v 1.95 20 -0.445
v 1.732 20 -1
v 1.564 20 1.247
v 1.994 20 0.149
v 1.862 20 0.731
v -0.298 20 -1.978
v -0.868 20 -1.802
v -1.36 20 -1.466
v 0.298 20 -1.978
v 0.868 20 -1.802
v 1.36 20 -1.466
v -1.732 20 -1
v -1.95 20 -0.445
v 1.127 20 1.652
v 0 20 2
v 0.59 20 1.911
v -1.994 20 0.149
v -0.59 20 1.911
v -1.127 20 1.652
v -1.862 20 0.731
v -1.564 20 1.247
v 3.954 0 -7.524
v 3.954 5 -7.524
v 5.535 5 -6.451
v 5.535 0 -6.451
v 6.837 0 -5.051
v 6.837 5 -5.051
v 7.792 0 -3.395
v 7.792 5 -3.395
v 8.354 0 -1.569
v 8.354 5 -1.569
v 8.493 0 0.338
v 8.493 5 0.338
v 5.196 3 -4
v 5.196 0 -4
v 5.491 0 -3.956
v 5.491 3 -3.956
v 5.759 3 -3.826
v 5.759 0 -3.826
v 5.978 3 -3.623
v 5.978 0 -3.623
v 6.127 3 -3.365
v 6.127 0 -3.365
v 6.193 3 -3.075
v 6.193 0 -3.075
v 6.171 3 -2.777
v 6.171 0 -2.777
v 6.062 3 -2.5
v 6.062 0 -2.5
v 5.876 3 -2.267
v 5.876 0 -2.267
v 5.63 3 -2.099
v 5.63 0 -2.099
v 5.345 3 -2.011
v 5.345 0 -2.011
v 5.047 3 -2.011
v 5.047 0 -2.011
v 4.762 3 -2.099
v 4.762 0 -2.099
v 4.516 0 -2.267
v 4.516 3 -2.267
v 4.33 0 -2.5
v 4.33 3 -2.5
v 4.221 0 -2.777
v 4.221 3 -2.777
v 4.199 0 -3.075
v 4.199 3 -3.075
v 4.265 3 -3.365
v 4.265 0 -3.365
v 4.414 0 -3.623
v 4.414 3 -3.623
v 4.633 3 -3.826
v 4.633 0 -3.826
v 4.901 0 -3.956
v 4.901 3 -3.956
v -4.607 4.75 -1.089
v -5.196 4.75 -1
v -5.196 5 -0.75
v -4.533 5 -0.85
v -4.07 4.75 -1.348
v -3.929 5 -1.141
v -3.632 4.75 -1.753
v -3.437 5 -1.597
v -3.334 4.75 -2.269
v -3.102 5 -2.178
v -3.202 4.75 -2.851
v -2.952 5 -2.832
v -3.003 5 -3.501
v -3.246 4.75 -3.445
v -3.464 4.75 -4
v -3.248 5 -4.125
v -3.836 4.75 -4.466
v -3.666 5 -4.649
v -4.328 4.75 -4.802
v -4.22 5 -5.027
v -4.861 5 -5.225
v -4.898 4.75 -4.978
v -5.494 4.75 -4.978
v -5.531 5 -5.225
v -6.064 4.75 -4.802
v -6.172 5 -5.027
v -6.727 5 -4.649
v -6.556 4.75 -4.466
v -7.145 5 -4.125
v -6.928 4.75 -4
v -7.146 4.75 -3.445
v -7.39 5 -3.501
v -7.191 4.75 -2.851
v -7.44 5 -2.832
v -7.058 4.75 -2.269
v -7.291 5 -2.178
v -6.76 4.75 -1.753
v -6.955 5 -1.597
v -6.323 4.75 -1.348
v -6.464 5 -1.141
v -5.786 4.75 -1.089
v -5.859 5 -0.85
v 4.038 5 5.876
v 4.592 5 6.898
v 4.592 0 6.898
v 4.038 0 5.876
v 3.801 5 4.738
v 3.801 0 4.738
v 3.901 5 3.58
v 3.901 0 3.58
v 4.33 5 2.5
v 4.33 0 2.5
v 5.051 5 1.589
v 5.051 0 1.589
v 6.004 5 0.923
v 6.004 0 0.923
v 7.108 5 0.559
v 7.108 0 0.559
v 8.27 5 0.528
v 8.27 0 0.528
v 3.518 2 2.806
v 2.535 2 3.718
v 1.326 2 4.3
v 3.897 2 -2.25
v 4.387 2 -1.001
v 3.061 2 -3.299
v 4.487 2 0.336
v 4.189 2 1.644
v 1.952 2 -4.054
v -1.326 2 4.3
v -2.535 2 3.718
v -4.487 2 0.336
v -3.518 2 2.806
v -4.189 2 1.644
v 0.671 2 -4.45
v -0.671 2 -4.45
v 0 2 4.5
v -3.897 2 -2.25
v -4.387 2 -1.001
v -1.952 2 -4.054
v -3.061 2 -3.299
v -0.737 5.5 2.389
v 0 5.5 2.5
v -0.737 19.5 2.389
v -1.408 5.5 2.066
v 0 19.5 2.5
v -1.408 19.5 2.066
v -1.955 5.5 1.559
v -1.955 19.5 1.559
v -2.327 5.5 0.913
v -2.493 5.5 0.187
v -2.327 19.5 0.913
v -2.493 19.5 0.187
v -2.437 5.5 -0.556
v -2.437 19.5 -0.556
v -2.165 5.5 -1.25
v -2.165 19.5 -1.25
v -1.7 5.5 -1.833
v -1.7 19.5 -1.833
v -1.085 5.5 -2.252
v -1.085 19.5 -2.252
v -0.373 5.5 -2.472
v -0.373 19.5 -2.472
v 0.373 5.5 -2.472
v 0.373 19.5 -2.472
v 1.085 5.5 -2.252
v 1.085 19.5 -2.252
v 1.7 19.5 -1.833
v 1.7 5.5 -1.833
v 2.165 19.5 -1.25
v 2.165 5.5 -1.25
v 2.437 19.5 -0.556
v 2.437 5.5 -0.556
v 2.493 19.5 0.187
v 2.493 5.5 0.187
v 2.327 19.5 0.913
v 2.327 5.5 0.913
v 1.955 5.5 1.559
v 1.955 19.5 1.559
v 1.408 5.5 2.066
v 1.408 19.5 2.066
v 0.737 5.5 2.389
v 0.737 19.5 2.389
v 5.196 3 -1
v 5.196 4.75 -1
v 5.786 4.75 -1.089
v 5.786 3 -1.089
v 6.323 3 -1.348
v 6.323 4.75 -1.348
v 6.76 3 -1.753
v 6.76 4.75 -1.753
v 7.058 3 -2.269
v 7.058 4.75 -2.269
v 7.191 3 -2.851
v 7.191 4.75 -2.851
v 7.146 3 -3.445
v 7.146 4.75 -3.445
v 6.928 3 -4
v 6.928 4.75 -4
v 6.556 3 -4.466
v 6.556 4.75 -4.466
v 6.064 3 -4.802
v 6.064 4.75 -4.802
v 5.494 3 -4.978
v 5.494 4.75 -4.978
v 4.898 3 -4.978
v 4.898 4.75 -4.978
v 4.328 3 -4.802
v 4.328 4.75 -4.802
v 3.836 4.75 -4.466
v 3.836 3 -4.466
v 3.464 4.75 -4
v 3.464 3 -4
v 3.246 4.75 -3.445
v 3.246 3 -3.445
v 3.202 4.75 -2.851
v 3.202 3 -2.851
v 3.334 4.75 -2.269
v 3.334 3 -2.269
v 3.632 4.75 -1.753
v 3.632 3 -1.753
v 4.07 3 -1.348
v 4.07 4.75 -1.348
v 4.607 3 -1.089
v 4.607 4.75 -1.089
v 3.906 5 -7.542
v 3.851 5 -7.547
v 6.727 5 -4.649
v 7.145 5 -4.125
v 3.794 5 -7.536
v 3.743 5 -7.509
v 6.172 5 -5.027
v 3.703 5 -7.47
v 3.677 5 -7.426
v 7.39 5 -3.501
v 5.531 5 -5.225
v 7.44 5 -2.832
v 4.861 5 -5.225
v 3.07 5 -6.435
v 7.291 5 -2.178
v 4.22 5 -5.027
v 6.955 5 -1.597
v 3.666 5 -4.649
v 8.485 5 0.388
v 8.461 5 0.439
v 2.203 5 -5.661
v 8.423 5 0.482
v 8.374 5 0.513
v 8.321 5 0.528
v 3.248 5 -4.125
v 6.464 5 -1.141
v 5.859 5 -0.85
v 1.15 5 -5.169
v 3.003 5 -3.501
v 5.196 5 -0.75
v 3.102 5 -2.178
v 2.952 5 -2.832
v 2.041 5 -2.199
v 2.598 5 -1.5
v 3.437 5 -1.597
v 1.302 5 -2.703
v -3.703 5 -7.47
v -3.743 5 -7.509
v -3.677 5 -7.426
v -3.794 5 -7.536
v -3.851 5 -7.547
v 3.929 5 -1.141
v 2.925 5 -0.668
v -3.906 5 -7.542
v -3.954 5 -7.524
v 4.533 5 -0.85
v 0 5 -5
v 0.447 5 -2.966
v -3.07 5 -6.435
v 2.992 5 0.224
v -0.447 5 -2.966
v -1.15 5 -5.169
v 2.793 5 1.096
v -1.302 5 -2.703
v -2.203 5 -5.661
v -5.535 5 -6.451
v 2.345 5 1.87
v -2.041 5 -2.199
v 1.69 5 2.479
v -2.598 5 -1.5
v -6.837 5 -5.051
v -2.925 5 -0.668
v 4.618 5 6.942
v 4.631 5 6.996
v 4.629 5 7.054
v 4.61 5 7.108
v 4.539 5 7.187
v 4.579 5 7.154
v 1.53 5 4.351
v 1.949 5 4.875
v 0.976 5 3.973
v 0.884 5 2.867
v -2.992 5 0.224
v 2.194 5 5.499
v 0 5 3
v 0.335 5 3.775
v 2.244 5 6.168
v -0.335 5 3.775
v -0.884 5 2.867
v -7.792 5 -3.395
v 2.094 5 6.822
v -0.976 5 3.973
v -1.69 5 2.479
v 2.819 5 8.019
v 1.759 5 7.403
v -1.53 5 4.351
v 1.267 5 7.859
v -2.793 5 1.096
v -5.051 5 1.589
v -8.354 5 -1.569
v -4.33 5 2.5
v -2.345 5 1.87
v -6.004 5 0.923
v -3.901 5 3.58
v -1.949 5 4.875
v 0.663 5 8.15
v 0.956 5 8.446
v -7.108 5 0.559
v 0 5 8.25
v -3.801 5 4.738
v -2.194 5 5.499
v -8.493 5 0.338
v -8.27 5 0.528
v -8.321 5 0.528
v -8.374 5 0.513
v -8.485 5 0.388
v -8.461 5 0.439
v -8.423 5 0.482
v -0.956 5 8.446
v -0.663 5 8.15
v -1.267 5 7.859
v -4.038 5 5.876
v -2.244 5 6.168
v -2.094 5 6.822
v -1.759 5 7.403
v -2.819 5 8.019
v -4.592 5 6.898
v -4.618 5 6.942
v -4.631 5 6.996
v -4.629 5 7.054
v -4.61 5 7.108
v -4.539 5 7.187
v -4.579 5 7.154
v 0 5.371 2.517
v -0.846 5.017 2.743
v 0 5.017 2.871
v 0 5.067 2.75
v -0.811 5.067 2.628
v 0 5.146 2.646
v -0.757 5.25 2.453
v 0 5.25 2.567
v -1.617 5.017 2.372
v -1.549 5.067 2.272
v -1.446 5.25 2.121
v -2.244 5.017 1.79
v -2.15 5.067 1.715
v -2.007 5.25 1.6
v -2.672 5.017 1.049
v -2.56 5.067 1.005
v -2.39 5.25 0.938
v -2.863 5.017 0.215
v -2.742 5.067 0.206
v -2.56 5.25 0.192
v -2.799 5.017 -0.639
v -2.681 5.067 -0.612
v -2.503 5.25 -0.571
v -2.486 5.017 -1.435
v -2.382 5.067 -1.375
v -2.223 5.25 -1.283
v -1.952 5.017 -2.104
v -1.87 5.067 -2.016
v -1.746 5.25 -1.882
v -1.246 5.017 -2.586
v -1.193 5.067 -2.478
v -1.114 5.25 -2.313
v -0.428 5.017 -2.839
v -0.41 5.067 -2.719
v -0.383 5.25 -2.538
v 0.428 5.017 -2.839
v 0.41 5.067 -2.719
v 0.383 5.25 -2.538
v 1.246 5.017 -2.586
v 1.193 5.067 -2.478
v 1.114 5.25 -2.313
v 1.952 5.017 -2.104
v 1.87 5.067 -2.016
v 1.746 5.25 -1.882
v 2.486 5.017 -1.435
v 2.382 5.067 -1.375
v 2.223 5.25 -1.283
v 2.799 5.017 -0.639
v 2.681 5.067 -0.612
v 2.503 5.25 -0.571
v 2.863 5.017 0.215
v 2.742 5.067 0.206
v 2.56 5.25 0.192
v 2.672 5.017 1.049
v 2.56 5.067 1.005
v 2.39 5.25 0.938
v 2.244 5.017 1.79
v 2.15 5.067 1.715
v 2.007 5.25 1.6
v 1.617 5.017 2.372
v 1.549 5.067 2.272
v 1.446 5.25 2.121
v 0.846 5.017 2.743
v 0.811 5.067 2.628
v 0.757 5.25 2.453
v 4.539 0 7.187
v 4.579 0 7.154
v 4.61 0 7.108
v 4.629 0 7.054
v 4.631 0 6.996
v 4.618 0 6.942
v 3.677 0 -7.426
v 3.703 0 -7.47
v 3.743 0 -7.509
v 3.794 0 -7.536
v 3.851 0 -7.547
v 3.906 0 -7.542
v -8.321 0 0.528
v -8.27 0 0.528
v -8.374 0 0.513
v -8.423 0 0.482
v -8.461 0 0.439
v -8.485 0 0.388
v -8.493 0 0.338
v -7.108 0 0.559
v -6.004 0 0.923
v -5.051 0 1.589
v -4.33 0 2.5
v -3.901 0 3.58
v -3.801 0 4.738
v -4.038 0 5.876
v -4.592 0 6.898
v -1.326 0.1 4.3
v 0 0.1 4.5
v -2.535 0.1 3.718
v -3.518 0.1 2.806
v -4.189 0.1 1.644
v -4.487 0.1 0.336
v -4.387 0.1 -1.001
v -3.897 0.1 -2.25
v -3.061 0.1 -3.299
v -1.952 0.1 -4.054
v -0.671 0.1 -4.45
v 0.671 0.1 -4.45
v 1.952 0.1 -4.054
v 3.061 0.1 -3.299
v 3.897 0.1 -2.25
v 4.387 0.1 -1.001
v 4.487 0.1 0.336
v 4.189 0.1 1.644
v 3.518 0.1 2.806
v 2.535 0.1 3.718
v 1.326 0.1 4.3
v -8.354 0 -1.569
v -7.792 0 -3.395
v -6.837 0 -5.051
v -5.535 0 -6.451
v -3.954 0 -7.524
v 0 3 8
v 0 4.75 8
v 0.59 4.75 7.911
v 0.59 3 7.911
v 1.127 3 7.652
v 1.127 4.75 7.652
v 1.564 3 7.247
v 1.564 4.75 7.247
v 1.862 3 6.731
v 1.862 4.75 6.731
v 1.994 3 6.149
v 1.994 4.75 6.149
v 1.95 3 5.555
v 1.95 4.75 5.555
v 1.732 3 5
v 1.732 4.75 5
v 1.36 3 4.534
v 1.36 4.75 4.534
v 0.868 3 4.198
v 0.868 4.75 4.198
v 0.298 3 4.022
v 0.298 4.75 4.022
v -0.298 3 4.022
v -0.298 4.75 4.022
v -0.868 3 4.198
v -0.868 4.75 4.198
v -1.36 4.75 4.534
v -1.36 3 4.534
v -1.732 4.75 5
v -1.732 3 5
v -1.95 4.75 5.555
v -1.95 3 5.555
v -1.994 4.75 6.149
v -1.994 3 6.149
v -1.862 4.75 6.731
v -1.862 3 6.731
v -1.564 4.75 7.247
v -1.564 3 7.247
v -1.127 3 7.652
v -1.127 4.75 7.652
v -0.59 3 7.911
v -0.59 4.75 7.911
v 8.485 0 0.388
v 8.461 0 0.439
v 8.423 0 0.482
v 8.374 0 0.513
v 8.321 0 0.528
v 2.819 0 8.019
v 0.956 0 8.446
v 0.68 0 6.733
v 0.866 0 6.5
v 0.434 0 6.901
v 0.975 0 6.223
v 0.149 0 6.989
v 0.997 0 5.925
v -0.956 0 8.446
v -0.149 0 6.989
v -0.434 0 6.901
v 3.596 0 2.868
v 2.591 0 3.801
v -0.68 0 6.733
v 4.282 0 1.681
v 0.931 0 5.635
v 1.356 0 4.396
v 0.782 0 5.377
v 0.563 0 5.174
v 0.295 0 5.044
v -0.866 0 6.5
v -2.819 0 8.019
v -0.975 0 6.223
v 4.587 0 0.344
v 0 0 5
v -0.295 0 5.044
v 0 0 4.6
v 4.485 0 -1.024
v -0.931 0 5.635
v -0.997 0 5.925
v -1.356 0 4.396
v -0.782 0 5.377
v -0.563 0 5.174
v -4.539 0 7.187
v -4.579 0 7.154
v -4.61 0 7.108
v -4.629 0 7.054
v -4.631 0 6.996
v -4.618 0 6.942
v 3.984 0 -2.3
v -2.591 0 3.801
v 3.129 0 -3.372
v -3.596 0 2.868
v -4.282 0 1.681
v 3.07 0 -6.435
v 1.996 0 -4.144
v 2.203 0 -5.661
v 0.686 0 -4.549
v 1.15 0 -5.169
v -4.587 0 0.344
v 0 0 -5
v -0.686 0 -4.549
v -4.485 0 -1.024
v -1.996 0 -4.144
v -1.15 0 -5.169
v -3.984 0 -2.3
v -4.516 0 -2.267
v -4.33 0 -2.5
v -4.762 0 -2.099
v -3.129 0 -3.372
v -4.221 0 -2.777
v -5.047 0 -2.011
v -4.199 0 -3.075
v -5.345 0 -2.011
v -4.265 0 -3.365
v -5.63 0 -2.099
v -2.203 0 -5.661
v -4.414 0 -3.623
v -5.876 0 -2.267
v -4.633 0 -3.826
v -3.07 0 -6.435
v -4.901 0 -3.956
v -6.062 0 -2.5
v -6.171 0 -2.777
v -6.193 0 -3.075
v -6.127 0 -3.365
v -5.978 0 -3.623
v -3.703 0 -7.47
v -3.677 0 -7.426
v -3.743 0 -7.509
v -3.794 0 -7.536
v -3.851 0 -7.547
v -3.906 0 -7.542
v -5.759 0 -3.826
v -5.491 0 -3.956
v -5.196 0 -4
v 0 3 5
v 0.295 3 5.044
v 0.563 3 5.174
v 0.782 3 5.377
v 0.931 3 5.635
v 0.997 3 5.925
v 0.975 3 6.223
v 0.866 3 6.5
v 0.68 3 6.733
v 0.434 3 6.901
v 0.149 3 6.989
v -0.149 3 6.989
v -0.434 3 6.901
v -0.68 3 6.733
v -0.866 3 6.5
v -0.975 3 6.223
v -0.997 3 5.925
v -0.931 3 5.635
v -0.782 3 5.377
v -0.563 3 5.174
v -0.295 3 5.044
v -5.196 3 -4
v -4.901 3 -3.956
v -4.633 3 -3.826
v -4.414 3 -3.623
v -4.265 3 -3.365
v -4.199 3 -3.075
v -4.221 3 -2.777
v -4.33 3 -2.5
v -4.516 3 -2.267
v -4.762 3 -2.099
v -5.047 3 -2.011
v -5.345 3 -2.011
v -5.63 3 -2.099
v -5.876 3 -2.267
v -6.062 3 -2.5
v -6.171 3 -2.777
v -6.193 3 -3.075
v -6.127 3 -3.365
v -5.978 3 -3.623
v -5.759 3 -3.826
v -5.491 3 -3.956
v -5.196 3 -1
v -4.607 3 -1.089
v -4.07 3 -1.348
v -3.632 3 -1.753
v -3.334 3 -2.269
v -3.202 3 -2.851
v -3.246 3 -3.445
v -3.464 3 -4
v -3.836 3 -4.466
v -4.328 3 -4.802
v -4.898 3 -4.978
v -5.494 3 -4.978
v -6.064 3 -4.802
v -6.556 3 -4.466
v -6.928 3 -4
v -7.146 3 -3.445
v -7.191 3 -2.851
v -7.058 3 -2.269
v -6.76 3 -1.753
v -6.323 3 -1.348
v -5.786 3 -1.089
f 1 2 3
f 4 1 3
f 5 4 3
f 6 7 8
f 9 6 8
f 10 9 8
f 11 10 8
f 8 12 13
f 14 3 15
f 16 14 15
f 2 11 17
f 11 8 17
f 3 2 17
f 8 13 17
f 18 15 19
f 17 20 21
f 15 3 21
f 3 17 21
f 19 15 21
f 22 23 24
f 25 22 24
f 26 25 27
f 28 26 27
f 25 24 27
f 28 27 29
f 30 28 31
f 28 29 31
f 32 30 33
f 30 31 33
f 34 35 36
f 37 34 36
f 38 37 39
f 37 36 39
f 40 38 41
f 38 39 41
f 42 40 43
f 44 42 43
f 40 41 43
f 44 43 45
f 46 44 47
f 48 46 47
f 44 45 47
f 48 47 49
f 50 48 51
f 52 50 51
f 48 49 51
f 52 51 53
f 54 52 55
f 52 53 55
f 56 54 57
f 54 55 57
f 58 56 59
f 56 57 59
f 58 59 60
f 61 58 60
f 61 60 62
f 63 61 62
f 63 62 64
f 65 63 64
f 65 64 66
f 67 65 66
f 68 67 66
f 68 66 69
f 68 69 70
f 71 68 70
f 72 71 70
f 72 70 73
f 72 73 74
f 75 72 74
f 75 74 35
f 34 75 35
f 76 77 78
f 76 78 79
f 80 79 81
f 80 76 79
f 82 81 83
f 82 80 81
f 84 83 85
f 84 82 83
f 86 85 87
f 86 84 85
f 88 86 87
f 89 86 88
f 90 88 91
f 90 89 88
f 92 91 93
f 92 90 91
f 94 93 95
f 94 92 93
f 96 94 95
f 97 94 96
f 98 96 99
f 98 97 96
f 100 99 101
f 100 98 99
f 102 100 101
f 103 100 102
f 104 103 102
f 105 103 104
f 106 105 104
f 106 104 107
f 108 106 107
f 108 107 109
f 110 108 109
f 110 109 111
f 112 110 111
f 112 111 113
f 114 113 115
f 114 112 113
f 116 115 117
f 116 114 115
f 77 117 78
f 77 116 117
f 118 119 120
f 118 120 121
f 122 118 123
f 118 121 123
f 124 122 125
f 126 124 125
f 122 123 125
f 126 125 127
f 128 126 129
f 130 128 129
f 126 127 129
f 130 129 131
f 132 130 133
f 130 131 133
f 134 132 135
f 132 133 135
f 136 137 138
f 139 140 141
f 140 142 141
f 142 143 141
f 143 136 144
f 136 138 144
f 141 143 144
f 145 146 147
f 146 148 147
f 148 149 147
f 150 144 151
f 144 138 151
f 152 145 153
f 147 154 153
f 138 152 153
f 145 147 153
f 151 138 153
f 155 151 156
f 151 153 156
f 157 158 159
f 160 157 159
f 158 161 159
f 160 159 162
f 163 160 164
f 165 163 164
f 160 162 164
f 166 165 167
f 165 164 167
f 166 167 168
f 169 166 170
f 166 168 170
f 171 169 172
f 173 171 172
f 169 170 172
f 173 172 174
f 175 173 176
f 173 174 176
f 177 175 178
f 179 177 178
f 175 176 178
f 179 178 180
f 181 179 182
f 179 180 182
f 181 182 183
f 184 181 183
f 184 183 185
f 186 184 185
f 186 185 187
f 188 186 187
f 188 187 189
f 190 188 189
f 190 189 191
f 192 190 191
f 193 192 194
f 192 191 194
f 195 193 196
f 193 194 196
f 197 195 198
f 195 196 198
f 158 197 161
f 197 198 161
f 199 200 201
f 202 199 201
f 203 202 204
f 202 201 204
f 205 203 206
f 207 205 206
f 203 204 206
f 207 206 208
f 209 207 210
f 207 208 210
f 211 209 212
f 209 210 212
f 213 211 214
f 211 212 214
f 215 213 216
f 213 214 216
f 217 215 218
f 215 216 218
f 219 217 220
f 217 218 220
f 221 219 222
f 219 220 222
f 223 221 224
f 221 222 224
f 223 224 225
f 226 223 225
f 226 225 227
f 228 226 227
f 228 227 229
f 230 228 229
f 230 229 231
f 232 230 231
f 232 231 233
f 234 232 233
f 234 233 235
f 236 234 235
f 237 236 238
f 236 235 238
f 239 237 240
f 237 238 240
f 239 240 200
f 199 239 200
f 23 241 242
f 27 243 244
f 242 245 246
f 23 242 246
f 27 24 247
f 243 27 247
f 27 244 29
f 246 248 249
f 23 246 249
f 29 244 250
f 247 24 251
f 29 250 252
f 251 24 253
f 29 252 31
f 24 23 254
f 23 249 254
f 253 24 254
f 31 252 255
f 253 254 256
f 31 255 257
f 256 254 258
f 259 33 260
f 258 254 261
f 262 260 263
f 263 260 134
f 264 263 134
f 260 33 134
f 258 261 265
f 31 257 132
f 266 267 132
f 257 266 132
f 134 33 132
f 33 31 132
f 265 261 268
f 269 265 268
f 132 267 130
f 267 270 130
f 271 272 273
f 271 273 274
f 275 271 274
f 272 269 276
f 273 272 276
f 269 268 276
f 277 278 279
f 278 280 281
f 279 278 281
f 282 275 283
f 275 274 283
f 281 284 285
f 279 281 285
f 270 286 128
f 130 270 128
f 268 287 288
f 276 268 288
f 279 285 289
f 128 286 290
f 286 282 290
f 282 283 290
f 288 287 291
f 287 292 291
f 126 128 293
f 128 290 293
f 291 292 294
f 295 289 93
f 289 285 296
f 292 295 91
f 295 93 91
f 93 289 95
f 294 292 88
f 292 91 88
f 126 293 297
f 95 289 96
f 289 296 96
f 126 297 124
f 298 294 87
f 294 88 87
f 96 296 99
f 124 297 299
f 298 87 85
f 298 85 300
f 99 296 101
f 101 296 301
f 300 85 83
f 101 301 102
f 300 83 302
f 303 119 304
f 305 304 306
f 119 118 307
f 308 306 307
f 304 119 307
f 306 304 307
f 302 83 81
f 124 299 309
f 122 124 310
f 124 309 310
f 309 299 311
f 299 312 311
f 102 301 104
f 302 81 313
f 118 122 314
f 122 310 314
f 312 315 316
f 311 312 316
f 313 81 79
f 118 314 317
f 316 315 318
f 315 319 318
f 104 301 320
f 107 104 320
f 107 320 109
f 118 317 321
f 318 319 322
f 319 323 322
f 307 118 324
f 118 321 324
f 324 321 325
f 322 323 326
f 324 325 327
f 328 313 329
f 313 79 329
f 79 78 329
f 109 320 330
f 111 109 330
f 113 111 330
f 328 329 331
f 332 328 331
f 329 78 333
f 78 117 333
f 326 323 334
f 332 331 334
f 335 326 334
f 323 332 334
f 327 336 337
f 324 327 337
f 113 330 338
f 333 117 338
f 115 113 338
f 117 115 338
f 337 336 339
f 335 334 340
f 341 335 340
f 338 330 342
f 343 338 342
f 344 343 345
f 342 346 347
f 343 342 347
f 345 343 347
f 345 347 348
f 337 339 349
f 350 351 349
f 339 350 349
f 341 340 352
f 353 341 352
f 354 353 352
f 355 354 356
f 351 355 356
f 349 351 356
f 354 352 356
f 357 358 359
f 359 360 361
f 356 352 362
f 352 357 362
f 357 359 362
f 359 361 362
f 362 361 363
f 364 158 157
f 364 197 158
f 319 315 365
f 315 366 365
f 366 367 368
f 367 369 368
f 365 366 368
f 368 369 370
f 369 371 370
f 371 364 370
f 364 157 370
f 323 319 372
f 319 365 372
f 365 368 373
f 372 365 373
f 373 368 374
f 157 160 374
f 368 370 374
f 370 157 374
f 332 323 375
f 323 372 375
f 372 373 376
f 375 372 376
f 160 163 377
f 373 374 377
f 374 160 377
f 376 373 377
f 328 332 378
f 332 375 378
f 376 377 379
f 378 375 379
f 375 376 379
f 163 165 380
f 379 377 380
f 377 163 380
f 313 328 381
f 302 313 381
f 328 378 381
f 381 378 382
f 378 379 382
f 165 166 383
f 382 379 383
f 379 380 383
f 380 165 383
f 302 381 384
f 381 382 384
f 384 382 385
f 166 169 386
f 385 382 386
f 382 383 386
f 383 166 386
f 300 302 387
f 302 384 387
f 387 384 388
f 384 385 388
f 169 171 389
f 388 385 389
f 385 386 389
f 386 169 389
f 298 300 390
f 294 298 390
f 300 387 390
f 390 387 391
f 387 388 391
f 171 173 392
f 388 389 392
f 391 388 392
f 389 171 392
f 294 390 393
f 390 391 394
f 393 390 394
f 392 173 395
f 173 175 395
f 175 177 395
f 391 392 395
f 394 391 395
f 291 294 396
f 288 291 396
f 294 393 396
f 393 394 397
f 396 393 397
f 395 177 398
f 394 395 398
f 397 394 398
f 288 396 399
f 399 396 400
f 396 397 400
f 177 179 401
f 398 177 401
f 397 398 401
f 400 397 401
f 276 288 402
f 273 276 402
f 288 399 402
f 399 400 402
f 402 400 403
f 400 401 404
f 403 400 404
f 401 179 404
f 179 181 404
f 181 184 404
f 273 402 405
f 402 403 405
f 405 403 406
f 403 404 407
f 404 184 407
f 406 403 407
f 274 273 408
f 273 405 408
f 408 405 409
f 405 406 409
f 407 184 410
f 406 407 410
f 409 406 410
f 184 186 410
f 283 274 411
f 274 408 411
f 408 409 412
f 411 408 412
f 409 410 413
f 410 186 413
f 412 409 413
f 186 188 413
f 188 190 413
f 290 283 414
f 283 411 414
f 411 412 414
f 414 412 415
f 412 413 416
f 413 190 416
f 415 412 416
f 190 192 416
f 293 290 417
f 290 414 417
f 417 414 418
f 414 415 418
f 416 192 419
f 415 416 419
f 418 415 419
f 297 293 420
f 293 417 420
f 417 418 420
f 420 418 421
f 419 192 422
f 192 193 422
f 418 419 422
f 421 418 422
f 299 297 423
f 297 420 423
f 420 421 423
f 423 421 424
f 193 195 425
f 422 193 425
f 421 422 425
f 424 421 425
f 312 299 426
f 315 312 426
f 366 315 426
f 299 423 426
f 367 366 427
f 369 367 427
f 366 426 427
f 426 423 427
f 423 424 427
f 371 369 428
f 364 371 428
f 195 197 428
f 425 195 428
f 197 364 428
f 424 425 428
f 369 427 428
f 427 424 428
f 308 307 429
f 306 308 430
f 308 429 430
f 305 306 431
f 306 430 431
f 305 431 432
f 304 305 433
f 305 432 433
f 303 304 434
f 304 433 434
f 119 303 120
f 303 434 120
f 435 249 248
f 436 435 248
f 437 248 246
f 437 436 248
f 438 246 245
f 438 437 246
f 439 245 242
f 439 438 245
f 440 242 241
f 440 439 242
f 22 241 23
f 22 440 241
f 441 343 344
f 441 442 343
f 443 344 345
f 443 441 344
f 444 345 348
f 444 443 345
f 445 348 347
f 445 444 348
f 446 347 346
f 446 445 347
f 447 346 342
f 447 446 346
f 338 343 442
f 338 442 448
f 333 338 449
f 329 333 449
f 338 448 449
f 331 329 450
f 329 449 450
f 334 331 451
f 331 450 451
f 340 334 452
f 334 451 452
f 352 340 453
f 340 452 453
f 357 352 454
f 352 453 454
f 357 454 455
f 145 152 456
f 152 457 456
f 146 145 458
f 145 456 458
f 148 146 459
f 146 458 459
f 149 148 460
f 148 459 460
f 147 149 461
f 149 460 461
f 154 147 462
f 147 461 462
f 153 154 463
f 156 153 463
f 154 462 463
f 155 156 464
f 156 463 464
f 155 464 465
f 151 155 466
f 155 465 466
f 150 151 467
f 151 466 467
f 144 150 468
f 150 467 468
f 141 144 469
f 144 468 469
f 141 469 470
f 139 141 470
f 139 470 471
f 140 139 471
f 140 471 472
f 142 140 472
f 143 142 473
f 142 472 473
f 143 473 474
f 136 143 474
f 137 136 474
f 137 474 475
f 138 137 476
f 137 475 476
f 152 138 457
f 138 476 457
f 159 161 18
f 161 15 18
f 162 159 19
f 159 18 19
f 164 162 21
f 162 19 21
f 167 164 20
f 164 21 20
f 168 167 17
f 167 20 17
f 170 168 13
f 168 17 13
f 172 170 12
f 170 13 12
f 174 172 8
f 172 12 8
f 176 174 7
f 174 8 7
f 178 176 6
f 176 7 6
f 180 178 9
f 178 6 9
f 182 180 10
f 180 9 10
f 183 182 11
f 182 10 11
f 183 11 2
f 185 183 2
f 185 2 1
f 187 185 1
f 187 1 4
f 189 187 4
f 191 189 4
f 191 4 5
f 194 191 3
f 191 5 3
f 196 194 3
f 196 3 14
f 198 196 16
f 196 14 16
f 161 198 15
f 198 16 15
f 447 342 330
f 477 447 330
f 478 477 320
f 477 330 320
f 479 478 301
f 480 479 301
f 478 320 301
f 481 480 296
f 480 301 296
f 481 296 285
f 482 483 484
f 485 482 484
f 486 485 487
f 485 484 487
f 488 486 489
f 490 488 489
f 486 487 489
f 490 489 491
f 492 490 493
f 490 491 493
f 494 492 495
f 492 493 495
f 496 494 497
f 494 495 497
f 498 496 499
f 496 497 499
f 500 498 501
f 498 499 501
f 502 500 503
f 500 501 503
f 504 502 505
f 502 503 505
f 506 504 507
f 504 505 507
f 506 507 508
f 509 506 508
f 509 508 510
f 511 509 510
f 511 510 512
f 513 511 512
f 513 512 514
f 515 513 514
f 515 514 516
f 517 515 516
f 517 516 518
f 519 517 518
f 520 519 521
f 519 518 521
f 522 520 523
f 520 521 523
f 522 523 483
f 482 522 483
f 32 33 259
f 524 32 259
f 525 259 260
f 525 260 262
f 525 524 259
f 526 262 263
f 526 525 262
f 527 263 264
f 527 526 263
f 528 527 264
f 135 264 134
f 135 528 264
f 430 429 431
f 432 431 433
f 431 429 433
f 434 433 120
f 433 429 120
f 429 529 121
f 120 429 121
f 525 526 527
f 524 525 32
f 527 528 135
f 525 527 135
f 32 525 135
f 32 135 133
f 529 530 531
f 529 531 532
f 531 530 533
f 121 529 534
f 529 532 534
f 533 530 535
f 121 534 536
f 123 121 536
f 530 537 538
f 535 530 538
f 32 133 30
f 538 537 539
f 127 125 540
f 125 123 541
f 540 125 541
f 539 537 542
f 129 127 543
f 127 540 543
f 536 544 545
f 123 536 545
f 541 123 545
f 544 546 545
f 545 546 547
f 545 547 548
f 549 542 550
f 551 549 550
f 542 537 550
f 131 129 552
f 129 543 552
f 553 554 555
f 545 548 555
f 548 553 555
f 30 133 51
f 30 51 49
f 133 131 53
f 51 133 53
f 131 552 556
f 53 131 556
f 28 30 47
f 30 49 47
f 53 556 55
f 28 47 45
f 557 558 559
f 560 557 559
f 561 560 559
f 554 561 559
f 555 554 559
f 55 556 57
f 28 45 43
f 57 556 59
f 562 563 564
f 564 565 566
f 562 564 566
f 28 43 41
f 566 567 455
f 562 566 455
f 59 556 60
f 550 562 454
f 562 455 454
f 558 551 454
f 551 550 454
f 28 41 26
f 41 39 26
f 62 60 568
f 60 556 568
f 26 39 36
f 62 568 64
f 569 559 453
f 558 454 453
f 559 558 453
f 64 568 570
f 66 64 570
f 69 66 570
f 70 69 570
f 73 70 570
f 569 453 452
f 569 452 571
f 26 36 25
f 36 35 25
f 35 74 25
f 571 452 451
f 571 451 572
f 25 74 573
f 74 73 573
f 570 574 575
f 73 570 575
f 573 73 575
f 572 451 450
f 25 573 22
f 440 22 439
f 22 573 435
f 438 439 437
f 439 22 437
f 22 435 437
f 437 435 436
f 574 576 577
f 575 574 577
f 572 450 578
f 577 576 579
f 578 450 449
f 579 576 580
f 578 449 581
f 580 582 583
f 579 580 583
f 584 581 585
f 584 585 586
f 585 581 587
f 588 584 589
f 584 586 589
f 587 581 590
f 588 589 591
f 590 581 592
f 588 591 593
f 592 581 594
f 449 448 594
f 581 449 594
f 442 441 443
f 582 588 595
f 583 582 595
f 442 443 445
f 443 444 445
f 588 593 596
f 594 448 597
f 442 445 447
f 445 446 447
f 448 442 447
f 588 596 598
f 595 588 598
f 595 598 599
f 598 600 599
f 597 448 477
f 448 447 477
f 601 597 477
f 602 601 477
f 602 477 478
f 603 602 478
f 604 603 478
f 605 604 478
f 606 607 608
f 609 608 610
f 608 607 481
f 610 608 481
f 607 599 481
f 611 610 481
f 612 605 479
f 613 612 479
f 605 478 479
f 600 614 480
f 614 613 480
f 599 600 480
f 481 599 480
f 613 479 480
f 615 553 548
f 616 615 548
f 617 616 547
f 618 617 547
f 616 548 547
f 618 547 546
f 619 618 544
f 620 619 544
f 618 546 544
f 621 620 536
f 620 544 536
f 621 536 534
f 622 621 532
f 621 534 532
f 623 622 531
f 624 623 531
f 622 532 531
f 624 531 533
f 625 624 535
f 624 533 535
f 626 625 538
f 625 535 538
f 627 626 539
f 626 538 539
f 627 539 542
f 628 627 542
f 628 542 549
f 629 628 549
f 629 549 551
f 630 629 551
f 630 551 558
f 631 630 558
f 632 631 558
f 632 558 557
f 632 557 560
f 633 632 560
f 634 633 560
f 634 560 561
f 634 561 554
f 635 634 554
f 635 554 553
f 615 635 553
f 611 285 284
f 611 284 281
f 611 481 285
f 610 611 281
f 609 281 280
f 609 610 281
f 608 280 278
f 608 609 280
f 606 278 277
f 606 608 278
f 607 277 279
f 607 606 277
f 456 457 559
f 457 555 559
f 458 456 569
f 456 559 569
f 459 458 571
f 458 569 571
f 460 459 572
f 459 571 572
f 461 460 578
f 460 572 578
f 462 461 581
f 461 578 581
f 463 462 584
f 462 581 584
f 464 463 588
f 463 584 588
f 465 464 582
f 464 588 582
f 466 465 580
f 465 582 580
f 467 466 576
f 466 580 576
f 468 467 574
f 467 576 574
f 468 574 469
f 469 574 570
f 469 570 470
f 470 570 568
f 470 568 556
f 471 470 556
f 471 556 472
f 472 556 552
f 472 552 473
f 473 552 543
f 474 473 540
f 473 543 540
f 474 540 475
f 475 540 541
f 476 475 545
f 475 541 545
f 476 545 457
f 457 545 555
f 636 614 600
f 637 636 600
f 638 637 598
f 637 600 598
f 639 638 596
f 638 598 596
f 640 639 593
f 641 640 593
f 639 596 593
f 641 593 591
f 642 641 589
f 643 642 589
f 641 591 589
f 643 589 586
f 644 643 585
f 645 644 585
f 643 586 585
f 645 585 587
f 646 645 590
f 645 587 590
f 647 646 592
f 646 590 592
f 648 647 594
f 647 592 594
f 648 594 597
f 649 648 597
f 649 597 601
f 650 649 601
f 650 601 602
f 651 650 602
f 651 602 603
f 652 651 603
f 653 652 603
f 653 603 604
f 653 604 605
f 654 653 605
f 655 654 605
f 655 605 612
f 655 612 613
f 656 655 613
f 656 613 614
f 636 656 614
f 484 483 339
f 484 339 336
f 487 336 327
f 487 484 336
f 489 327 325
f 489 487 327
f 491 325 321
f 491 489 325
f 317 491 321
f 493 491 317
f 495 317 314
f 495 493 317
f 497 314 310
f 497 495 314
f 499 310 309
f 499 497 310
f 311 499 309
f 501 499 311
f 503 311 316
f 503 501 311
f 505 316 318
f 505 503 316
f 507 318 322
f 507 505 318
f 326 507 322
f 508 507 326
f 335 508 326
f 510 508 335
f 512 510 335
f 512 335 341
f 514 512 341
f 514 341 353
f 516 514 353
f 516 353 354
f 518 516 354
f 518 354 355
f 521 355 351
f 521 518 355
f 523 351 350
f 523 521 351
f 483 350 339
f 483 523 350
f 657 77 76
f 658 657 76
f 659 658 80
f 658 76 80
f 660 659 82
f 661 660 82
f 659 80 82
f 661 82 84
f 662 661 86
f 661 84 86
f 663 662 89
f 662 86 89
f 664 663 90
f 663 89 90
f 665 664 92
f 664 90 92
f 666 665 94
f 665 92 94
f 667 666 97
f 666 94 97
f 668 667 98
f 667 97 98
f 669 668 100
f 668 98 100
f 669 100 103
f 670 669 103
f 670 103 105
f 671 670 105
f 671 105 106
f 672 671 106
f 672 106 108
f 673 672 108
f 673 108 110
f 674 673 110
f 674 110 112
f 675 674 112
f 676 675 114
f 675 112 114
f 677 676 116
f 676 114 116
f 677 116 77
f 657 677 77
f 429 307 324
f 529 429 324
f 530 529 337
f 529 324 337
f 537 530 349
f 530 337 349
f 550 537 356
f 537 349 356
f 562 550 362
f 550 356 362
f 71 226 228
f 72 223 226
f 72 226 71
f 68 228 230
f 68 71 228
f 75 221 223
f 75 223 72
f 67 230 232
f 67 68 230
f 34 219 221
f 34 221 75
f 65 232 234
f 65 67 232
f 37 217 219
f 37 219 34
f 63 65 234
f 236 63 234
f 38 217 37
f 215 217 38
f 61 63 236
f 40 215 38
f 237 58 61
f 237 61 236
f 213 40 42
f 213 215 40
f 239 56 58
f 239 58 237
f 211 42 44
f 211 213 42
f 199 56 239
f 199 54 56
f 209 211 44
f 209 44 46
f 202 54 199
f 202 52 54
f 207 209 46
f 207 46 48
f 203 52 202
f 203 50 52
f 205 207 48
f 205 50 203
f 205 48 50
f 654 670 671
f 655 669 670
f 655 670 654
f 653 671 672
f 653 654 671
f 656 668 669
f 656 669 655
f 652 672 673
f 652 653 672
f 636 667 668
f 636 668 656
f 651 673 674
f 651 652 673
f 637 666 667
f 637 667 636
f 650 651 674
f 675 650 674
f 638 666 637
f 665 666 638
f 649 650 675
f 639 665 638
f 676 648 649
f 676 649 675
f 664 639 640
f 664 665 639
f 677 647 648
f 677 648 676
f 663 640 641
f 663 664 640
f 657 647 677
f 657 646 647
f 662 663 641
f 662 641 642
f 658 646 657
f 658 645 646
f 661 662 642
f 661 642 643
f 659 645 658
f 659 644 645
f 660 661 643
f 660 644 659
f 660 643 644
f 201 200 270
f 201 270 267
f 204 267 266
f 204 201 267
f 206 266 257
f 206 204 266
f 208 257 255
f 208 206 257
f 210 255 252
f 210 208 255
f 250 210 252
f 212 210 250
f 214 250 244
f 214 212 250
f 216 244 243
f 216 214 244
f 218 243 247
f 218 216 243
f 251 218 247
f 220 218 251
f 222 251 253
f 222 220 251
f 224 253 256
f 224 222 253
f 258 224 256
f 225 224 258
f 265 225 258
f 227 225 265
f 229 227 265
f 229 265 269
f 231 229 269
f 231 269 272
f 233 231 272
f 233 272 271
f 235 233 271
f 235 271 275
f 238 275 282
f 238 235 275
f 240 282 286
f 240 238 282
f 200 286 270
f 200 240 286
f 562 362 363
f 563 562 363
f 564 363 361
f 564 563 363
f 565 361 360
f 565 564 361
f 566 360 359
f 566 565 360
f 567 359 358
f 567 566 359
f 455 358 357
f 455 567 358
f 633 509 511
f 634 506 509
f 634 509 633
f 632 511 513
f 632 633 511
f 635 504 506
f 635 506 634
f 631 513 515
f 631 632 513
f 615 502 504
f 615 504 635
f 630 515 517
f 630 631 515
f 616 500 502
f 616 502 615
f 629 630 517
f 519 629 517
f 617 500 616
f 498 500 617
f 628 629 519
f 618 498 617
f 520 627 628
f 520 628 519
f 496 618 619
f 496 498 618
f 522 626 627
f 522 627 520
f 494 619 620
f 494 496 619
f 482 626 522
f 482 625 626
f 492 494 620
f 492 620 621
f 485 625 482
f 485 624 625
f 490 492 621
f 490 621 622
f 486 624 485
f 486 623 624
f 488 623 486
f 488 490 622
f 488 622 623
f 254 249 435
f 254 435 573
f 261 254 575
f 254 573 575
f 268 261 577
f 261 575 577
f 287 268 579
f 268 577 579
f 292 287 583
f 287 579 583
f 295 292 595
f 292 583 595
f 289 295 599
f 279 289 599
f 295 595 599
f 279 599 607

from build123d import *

# Parameters (mm, degrees)
CUT_EXTRUDE1_REACH = 25.335
SKETCH2_R          = 4
SKETCH2_R_2        = 1
FILLET1_R          = 0.2
SKETCH3_R          = 2
CUT_EXTRUDE2_DEPTH = 2
CHAMFER1_SIZE      = 0.25


with BuildPart() as part:
    # Sketch1 → Revolve1 (revolve)
    with BuildSketch(Plane.XY, mode=Mode.PRIVATE) as revolve1_sk:
        with BuildLine():
            Line((4.6, 0), (8.5, 0))
            Line((8.5, 0), (8.5, 5))
            Line((8.5, 5), (3, 5))
            ThreePointArc((3, 5), (2.646446609, 5.146446609), (2.5, 5.5))
            Line((2.5, 5.5), (2.5, 19.5))
            Line((2.5, 19.5), (2, 20))
            Line((2, 20), (0, 20))
            Line((0, 20), (0, 2))
            Line((0, 2), (4.5, 2))
            Line((4.5, 2), (4.5, 0.1))
            Line((4.5, 0.1), (4.6, 0))
        make_face()
    revolve(revolve1_sk.sketch.rotate(Axis((0, 20, 0), (0, -1, 0)), 90), axis=Axis((0, 20, 0), (0, -1, 0)))

    # Sketch2 → Cut-Extrude1 (cut, up to next)
    with BuildSketch(Plane.XZ, mode=Mode.PRIVATE) as cut_extrude1_sk1:
        with Locations((7.794228634, 4.5)):
            Circle(SKETCH2_R)
    cut_extrude1_tool1 = extrude(cut_extrude1_sk1.sketch, amount=-CUT_EXTRUDE1_REACH, mode=Mode.PRIVATE) & part.part
    # Sketch2 → Cut-Extrude1 (cut, up to next)
    with BuildSketch(Plane.XZ, mode=Mode.PRIVATE) as cut_extrude1_sk2:
        with Locations(Location((0, 6, 0), (0, 0, 270))):
            Circle(SKETCH2_R_2)
    cut_extrude1_tool2 = extrude(cut_extrude1_sk2.sketch, amount=-CUT_EXTRUDE1_REACH, mode=Mode.PRIVATE) & part.part
    # Sketch2 → Cut-Extrude1 (cut, up to next)
    with BuildSketch(Plane.XZ, mode=Mode.PRIVATE) as cut_extrude1_sk3:
        with Locations(Location((5.196152423, -3, 0), (0, 0, 270))):
            Circle(SKETCH2_R_2)
    cut_extrude1_tool3 = extrude(cut_extrude1_sk3.sketch, amount=-CUT_EXTRUDE1_REACH, mode=Mode.PRIVATE) & part.part
    # Sketch2 → Cut-Extrude1 (cut, up to next)
    with BuildSketch(Plane.XZ, mode=Mode.PRIVATE) as cut_extrude1_sk4:
        with Locations((0, -9)):
            Circle(SKETCH2_R)
    cut_extrude1_tool4 = extrude(cut_extrude1_sk4.sketch, amount=-CUT_EXTRUDE1_REACH, mode=Mode.PRIVATE) & part.part
    # Sketch2 → Cut-Extrude1 (cut, up to next)
    with BuildSketch(Plane.XZ, mode=Mode.PRIVATE) as cut_extrude1_sk5:
        with Locations(Location((-5.196152423, -3, 0), (0, 0, 270))):
            Circle(SKETCH2_R_2)
    cut_extrude1_tool5 = extrude(cut_extrude1_sk5.sketch, amount=-CUT_EXTRUDE1_REACH, mode=Mode.PRIVATE) & part.part
    # Sketch2 → Cut-Extrude1 (cut, up to next)
    with BuildSketch(Plane.XZ, mode=Mode.PRIVATE) as cut_extrude1_sk6:
        with Locations((-7.794228634, 4.5)):
            Circle(SKETCH2_R)
    cut_extrude1_tool6 = extrude(cut_extrude1_sk6.sketch, amount=-CUT_EXTRUDE1_REACH, mode=Mode.PRIVATE) & part.part
    add(cut_extrude1_tool1.solids().sort_by_distance((7.794229, 0, 4.5))[0], mode=Mode.SUBTRACT)
    add(cut_extrude1_tool2.solids().sort_by_distance((0, 0, 6))[0], mode=Mode.SUBTRACT)
    add(cut_extrude1_tool3.solids().sort_by_distance((5.196152, 0, -3))[0], mode=Mode.SUBTRACT)
    add(cut_extrude1_tool4.solids().sort_by_distance((0, 0, -9))[0], mode=Mode.SUBTRACT)
    add(cut_extrude1_tool5.solids().sort_by_distance((-5.196152, 0, -3))[0], mode=Mode.SUBTRACT)
    add(cut_extrude1_tool6.solids().sort_by_distance((-7.794229, 0, 4.5))[0], mode=Mode.SUBTRACT)

    # Fillet1
    fillet1_edges = [part.edges().sort_by_distance(p)[0] for p in [
        (8.481566104, 2.5, 0.55949658),
        (4.725321304, 2.5, 7.06550342),
        (-3.7562448, 2.5, -7.625),
        (3.7562448, 2.5, -7.625),
        (-4.725321304, 2.5, 7.06550342),
        (-8.481566104, 2.5, 0.55949658),
    ]]
    fillet(fillet1_edges, radius=FILLET1_R)

    # Sketch3 → Cut-Extrude2 (cut)
    with BuildSketch(Plane(origin=(0, 5, 0), x_dir=(1, 0, 0), z_dir=(0, 1, 0))):
        with Locations(Location((0, -6, 0), (0, 0, 270))):
            Circle(SKETCH3_R)
        with Locations(Location((-5.196152423, 3, 0), (0, 0, 270))):
            Circle(SKETCH3_R)
        with Locations(Location((5.196152423, 3, 0), (0, 0, 270))):
            Circle(SKETCH3_R)
    extrude(amount=-CUT_EXTRUDE2_DEPTH, mode=Mode.SUBTRACT)

    # Chamfer1
    chamfer1_edges = [part.edges().sort_by_distance(p)[0] for p in [
        (-5.196152423, 5, -5),
        (5.196152423, 5, -5),
        (0, 5, 4),
    ]]
    chamfer(chamfer1_edges, length=CHAMFER1_SIZE)


solid = part.part
